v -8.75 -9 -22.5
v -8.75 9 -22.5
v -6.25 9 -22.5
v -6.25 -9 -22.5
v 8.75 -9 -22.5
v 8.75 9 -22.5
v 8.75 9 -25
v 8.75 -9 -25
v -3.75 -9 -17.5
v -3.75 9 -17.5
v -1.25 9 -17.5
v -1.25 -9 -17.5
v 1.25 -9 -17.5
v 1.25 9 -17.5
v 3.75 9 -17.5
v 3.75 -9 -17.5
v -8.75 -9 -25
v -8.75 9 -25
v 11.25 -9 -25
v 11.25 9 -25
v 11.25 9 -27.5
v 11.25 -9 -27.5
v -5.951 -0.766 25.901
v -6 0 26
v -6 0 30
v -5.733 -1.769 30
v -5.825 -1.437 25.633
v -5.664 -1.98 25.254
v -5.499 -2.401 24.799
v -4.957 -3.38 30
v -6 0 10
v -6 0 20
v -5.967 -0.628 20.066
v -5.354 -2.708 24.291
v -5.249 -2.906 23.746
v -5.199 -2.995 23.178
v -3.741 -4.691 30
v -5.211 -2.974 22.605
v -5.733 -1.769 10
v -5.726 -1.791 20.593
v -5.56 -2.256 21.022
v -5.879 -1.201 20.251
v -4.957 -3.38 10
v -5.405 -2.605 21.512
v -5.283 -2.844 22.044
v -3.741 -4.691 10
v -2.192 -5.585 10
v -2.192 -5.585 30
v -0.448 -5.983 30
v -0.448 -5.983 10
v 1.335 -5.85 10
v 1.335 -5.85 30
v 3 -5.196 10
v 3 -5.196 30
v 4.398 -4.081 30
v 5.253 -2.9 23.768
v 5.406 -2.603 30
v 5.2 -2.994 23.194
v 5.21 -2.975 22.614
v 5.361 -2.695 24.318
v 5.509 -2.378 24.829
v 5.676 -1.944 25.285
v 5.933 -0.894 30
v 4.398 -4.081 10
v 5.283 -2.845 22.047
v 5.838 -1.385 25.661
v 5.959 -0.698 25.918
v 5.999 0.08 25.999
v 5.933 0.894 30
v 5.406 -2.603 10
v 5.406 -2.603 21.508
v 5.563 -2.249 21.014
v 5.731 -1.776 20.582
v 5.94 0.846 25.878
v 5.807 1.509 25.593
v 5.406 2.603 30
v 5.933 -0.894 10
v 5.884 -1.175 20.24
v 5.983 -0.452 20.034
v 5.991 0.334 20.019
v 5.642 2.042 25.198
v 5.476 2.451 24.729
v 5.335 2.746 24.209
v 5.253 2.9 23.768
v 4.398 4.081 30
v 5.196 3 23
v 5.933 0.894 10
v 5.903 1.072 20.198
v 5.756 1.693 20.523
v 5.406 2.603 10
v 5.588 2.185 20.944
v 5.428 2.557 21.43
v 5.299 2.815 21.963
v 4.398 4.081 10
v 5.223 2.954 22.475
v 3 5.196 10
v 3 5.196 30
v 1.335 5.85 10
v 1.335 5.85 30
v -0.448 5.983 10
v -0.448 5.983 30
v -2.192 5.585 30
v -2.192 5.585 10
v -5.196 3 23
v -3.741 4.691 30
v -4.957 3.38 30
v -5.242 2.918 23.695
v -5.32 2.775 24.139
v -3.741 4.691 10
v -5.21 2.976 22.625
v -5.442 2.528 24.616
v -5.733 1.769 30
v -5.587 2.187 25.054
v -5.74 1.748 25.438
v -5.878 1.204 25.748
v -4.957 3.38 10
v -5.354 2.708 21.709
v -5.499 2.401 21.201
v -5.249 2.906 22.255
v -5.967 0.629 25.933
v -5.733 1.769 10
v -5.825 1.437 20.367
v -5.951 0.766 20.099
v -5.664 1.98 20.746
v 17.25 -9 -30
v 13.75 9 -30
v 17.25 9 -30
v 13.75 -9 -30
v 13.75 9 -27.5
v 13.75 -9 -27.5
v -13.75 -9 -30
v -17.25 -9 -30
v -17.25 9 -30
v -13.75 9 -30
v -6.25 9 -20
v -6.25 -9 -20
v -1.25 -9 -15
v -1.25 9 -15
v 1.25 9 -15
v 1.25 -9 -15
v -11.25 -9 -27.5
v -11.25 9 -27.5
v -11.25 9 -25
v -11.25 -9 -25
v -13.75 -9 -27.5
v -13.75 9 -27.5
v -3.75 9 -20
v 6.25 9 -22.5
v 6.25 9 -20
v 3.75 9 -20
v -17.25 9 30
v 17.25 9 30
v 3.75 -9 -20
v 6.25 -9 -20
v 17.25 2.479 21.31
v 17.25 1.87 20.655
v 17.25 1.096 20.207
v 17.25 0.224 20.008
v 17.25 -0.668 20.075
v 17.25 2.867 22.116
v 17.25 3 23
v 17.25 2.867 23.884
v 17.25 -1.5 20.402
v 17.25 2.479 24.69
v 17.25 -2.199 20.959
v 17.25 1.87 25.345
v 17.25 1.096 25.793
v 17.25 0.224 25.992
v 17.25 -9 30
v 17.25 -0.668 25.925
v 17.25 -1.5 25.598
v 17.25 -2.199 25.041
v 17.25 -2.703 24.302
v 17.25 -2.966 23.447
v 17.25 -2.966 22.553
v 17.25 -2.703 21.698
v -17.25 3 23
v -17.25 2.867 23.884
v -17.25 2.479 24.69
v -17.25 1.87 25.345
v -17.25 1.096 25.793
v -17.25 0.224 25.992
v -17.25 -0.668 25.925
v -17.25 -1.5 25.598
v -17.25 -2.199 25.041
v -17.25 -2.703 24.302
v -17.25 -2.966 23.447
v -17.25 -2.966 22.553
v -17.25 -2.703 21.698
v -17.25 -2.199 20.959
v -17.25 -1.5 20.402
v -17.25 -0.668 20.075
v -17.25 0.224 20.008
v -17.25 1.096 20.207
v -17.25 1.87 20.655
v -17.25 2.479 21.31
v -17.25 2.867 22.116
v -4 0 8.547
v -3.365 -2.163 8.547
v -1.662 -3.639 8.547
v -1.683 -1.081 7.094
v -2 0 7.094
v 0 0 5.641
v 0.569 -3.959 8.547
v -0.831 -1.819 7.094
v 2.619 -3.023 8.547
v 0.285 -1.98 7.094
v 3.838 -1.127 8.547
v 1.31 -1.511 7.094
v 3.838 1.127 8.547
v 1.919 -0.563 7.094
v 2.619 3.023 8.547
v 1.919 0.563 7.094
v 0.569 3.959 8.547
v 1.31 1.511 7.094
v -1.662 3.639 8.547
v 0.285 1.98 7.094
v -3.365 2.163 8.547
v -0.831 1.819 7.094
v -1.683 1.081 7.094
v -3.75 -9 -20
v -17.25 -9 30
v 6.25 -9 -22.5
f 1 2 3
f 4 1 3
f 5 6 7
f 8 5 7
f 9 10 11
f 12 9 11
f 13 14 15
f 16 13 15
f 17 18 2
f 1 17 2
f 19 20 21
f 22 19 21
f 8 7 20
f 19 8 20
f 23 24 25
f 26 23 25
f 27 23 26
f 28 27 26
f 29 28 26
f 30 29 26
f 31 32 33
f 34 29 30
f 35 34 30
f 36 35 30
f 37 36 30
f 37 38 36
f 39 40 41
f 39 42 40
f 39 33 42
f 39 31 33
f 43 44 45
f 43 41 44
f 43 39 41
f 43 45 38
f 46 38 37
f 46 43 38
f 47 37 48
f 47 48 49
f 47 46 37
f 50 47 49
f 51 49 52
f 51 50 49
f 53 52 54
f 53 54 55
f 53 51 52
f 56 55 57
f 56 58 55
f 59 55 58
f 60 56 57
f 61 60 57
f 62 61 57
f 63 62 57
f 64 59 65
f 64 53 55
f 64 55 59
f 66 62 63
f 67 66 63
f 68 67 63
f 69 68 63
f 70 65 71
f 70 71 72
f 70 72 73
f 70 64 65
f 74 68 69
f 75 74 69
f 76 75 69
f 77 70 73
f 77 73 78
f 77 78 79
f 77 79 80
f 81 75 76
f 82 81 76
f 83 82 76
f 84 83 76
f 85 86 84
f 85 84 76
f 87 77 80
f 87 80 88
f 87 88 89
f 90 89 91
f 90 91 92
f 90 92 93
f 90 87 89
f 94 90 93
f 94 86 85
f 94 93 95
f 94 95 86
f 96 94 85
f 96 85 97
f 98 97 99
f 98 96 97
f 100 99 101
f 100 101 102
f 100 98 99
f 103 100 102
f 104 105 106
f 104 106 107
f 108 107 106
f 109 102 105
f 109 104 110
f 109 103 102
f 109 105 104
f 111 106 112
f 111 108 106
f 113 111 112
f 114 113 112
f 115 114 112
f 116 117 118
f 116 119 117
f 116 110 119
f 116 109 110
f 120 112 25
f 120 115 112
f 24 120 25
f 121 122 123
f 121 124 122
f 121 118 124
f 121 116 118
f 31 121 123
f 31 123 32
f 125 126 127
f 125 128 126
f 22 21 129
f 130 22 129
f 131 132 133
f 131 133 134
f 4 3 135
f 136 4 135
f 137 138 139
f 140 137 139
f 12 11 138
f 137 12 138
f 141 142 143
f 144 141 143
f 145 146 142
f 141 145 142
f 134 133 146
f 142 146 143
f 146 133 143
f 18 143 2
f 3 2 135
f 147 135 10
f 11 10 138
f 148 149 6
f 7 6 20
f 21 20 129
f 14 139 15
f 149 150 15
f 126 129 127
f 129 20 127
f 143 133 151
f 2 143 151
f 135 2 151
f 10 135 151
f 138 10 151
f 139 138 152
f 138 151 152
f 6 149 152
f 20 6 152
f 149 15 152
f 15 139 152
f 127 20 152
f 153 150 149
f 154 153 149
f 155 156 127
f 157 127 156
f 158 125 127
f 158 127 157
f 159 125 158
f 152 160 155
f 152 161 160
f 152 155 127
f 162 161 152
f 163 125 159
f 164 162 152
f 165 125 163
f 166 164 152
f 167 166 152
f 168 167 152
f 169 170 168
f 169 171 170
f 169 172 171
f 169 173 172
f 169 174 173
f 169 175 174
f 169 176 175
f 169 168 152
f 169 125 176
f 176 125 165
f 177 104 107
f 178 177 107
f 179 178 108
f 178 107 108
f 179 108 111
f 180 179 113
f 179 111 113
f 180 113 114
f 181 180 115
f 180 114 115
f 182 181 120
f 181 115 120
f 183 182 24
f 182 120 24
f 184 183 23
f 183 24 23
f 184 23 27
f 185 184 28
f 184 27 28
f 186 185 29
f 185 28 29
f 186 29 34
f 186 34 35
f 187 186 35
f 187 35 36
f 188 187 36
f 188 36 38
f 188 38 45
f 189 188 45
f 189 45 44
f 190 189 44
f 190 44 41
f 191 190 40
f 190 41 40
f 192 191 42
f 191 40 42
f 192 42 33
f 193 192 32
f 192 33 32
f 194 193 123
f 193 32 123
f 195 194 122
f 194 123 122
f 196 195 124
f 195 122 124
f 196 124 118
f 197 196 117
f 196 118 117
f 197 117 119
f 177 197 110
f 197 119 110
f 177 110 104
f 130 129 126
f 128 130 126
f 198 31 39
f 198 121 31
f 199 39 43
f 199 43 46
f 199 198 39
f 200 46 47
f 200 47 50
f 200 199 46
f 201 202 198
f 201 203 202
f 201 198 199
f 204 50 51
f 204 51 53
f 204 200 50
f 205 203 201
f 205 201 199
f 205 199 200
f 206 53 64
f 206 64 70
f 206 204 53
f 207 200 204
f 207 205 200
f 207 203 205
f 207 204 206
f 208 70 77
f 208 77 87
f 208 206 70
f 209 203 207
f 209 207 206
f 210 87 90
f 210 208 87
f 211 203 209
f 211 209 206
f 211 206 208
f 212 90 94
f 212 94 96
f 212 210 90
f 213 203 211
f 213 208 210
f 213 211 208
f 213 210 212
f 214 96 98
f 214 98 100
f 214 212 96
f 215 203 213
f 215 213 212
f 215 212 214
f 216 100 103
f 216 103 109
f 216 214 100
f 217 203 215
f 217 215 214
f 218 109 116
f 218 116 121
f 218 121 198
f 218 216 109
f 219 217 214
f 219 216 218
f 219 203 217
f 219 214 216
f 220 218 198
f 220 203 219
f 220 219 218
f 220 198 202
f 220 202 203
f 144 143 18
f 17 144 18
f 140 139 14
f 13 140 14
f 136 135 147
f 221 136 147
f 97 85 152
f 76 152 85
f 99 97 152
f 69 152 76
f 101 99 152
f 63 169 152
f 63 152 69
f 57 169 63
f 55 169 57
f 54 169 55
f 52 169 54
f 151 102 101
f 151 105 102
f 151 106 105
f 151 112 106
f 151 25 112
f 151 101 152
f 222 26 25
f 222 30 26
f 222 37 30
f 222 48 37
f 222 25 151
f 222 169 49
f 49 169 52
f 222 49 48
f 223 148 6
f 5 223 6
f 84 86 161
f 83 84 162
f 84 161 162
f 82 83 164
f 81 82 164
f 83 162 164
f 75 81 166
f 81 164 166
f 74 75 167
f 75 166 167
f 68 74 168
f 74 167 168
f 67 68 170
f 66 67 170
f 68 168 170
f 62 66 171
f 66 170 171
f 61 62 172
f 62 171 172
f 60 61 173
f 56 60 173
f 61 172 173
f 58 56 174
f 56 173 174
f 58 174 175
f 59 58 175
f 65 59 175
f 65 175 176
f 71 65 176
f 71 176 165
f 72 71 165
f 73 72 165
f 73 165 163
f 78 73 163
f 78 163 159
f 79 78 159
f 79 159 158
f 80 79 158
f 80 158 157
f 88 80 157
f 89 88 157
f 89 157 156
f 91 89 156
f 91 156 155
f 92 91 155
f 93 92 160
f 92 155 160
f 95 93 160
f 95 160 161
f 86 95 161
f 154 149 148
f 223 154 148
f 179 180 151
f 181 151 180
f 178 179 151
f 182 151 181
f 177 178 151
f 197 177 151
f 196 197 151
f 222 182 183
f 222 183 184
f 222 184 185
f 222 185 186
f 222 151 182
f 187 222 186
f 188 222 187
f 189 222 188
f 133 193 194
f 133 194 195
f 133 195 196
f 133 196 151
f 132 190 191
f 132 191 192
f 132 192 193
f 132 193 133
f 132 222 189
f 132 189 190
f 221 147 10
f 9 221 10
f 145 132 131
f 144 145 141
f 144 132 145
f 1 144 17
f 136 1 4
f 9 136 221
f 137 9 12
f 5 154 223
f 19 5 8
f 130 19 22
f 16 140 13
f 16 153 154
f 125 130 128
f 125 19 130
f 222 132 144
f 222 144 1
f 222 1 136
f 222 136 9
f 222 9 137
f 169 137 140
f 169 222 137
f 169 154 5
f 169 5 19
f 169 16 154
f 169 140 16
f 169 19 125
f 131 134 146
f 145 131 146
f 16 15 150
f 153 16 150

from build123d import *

# Parameters (mm, degrees)
F1_DEPTH = 9
F2_R     = 3
F3_DEPTH = 35


with BuildPart() as f1:
    # F0 (on Front) → F1 (new body, symmetric)
    with BuildSketch(Plane.XZ):
        Polygon((17.25, -30), (17.25, 30), (-17.25, 30), (-17.25, -30), (-13.75, -30), (-13.75, -27.5), (-11.25, -27.5), (-11.25, -25), (-8.75, -25), (-8.75, -22.5), (-6.25, -22.5), (-6.25, -20), (-3.75, -20), (-3.75, -17.5), (-1.25, -17.5), (-1.25, -15), (1.25, -15), (1.25, -17.5), (3.75, -17.5), (3.75, -20), (6.25, -20), (6.25, -22.5), (8.75, -22.5), (8.75, -25), (11.25, -25), (11.25, -27.5), (13.75, -27.5), (13.75, -30), align=None)
    extrude(amount=F1_DEPTH, both=True)

    # F2 (on face) → F3 (cut)
    with BuildSketch(Plane.YZ.offset(17.25)):
        with Locations((0, 23)):
            Circle(F2_R)
    extrude(amount=-F3_DEPTH, mode=Mode.SUBTRACT)

    # F5 (on mid) → F6 (revolve, cut)
    with BuildSketch(Plane.XZ):
        Polygon((0, 30), (-6, 30), (-6, 10), (0, 5.640744832), align=None)
    revolve(axis=Axis((0, 0, 17.820372416), (0, 0, 1)), mode=Mode.SUBTRACT)


solid = f1.part
